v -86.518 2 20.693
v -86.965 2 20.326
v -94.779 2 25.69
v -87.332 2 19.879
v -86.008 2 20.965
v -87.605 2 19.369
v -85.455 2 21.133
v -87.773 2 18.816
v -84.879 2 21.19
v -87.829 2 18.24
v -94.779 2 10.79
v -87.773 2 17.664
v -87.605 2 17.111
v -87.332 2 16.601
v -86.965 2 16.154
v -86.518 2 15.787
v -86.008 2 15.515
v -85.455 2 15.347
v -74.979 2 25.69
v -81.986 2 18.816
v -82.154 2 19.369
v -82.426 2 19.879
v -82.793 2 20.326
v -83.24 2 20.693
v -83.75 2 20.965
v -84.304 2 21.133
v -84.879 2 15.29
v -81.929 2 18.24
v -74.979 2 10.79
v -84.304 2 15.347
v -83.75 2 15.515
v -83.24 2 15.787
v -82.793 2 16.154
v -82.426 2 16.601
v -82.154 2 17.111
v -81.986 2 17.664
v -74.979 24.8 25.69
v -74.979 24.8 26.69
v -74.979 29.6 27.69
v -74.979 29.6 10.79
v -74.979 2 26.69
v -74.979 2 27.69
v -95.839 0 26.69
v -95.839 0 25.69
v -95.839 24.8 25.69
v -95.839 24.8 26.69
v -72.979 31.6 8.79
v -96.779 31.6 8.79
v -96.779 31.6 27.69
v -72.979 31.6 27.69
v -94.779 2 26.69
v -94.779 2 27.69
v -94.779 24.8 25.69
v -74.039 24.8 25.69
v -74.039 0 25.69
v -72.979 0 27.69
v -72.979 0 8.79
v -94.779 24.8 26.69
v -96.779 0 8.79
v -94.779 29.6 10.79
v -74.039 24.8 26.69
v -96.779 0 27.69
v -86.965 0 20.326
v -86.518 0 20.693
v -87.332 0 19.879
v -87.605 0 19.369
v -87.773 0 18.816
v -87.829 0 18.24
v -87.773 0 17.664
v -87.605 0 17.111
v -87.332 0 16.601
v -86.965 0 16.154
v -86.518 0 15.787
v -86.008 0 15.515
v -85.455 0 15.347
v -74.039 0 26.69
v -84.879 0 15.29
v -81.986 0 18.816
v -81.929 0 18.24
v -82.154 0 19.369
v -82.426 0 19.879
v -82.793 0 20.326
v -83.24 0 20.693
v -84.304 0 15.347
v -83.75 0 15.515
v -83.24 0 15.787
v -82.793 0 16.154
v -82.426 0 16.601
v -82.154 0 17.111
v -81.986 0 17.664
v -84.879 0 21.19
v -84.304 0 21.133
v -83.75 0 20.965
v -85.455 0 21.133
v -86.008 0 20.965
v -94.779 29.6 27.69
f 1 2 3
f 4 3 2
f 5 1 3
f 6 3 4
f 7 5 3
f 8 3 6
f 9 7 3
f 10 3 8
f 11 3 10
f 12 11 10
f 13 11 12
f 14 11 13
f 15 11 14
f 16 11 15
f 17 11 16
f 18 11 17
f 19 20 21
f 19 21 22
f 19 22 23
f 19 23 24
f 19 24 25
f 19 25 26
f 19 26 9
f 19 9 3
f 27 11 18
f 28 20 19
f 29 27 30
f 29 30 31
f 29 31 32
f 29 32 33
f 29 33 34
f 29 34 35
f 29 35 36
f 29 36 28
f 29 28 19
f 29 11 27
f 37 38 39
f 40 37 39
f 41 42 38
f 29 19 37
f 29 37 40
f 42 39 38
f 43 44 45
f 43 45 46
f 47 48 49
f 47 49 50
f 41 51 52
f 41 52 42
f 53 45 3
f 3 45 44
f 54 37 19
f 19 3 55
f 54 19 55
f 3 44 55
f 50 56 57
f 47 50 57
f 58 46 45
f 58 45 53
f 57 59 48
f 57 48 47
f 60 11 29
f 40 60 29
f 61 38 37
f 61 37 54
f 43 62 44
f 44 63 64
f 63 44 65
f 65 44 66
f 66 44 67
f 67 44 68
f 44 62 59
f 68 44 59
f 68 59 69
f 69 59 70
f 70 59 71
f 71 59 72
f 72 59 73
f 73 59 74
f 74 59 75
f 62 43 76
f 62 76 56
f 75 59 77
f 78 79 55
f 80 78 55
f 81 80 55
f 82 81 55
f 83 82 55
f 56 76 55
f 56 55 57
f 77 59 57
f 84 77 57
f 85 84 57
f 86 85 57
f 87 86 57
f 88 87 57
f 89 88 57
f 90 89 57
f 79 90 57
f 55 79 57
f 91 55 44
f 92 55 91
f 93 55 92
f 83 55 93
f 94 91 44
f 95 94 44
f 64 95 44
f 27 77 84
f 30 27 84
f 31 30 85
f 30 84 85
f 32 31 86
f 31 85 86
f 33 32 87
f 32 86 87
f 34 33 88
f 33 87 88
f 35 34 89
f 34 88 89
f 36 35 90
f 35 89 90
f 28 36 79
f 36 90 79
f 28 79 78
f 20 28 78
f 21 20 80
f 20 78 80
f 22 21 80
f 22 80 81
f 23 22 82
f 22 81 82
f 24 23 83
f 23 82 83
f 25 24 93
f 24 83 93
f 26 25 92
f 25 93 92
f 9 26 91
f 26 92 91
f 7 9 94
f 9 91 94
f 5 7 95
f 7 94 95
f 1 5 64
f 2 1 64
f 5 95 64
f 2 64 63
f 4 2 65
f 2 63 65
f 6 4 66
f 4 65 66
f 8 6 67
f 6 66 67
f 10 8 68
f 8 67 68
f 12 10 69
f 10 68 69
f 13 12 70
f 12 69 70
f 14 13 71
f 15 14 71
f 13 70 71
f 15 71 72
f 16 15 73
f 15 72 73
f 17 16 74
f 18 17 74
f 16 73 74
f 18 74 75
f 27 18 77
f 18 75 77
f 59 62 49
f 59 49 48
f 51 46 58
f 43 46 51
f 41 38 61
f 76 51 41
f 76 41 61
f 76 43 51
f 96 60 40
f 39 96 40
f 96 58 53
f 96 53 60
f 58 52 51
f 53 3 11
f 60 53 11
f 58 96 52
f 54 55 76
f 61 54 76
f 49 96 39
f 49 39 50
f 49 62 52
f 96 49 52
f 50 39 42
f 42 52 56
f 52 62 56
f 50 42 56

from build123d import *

# Parameters (mm, degrees)
SKETCH2_W           = 23.8
SKETCH2_H           = 18.9
BOSS_EXTRUDE1_DEPTH = 31.6
SHELL2_T            = -2
SKETCH10_W          = 21.8
SKETCH10_H          = 1
CUT_EXTRUDE5_DEPTH  = 24.8
SKETCH12_R          = 2.95
CUT_EXTRUDE6_DEPTH  = 2


with BuildPart() as part:
    # Sketch2 → Boss-Extrude1 (new body)
    with BuildSketch(Plane(origin=(-2.162079654, 0, 0), x_dir=(1, 0, 0), z_dir=(0, 1, 0))):
        with Locations((-82.717170842, -18.240014695)):
            Rectangle(SKETCH2_W, SKETCH2_H)
    extrude(amount=BOSS_EXTRUDE1_DEPTH)

    # Shell2
    shell2_openings = [part.faces().sort_by_distance(p)[0] for p in [
        (-84.879250496, 15.8, 27.690014695),
    ]]
    offset(amount=SHELL2_T, openings=shell2_openings, kind=Kind.INTERSECTION)

    # Sketch10 → Cut-Extrude5 (cut)
    with BuildSketch(Plane.XZ):
        with Locations((-84.938526567, 26.190014695)):
            Rectangle(SKETCH10_W, SKETCH10_H)
    extrude(amount=-CUT_EXTRUDE5_DEPTH, mode=Mode.SUBTRACT)

    # Sketch12 → Cut-Extrude6 (cut)
    with BuildSketch(Plane(origin=(0, 0, 0), x_dir=(-1, 0, 0), z_dir=(0, -1, 0))):
        with Locations(Location((84.879250496, -18.240014695, 0), (0, 0, 90))):
            Circle(SKETCH12_R)
    extrude(amount=-CUT_EXTRUDE6_DEPTH, mode=Mode.SUBTRACT)


solid = part.part
